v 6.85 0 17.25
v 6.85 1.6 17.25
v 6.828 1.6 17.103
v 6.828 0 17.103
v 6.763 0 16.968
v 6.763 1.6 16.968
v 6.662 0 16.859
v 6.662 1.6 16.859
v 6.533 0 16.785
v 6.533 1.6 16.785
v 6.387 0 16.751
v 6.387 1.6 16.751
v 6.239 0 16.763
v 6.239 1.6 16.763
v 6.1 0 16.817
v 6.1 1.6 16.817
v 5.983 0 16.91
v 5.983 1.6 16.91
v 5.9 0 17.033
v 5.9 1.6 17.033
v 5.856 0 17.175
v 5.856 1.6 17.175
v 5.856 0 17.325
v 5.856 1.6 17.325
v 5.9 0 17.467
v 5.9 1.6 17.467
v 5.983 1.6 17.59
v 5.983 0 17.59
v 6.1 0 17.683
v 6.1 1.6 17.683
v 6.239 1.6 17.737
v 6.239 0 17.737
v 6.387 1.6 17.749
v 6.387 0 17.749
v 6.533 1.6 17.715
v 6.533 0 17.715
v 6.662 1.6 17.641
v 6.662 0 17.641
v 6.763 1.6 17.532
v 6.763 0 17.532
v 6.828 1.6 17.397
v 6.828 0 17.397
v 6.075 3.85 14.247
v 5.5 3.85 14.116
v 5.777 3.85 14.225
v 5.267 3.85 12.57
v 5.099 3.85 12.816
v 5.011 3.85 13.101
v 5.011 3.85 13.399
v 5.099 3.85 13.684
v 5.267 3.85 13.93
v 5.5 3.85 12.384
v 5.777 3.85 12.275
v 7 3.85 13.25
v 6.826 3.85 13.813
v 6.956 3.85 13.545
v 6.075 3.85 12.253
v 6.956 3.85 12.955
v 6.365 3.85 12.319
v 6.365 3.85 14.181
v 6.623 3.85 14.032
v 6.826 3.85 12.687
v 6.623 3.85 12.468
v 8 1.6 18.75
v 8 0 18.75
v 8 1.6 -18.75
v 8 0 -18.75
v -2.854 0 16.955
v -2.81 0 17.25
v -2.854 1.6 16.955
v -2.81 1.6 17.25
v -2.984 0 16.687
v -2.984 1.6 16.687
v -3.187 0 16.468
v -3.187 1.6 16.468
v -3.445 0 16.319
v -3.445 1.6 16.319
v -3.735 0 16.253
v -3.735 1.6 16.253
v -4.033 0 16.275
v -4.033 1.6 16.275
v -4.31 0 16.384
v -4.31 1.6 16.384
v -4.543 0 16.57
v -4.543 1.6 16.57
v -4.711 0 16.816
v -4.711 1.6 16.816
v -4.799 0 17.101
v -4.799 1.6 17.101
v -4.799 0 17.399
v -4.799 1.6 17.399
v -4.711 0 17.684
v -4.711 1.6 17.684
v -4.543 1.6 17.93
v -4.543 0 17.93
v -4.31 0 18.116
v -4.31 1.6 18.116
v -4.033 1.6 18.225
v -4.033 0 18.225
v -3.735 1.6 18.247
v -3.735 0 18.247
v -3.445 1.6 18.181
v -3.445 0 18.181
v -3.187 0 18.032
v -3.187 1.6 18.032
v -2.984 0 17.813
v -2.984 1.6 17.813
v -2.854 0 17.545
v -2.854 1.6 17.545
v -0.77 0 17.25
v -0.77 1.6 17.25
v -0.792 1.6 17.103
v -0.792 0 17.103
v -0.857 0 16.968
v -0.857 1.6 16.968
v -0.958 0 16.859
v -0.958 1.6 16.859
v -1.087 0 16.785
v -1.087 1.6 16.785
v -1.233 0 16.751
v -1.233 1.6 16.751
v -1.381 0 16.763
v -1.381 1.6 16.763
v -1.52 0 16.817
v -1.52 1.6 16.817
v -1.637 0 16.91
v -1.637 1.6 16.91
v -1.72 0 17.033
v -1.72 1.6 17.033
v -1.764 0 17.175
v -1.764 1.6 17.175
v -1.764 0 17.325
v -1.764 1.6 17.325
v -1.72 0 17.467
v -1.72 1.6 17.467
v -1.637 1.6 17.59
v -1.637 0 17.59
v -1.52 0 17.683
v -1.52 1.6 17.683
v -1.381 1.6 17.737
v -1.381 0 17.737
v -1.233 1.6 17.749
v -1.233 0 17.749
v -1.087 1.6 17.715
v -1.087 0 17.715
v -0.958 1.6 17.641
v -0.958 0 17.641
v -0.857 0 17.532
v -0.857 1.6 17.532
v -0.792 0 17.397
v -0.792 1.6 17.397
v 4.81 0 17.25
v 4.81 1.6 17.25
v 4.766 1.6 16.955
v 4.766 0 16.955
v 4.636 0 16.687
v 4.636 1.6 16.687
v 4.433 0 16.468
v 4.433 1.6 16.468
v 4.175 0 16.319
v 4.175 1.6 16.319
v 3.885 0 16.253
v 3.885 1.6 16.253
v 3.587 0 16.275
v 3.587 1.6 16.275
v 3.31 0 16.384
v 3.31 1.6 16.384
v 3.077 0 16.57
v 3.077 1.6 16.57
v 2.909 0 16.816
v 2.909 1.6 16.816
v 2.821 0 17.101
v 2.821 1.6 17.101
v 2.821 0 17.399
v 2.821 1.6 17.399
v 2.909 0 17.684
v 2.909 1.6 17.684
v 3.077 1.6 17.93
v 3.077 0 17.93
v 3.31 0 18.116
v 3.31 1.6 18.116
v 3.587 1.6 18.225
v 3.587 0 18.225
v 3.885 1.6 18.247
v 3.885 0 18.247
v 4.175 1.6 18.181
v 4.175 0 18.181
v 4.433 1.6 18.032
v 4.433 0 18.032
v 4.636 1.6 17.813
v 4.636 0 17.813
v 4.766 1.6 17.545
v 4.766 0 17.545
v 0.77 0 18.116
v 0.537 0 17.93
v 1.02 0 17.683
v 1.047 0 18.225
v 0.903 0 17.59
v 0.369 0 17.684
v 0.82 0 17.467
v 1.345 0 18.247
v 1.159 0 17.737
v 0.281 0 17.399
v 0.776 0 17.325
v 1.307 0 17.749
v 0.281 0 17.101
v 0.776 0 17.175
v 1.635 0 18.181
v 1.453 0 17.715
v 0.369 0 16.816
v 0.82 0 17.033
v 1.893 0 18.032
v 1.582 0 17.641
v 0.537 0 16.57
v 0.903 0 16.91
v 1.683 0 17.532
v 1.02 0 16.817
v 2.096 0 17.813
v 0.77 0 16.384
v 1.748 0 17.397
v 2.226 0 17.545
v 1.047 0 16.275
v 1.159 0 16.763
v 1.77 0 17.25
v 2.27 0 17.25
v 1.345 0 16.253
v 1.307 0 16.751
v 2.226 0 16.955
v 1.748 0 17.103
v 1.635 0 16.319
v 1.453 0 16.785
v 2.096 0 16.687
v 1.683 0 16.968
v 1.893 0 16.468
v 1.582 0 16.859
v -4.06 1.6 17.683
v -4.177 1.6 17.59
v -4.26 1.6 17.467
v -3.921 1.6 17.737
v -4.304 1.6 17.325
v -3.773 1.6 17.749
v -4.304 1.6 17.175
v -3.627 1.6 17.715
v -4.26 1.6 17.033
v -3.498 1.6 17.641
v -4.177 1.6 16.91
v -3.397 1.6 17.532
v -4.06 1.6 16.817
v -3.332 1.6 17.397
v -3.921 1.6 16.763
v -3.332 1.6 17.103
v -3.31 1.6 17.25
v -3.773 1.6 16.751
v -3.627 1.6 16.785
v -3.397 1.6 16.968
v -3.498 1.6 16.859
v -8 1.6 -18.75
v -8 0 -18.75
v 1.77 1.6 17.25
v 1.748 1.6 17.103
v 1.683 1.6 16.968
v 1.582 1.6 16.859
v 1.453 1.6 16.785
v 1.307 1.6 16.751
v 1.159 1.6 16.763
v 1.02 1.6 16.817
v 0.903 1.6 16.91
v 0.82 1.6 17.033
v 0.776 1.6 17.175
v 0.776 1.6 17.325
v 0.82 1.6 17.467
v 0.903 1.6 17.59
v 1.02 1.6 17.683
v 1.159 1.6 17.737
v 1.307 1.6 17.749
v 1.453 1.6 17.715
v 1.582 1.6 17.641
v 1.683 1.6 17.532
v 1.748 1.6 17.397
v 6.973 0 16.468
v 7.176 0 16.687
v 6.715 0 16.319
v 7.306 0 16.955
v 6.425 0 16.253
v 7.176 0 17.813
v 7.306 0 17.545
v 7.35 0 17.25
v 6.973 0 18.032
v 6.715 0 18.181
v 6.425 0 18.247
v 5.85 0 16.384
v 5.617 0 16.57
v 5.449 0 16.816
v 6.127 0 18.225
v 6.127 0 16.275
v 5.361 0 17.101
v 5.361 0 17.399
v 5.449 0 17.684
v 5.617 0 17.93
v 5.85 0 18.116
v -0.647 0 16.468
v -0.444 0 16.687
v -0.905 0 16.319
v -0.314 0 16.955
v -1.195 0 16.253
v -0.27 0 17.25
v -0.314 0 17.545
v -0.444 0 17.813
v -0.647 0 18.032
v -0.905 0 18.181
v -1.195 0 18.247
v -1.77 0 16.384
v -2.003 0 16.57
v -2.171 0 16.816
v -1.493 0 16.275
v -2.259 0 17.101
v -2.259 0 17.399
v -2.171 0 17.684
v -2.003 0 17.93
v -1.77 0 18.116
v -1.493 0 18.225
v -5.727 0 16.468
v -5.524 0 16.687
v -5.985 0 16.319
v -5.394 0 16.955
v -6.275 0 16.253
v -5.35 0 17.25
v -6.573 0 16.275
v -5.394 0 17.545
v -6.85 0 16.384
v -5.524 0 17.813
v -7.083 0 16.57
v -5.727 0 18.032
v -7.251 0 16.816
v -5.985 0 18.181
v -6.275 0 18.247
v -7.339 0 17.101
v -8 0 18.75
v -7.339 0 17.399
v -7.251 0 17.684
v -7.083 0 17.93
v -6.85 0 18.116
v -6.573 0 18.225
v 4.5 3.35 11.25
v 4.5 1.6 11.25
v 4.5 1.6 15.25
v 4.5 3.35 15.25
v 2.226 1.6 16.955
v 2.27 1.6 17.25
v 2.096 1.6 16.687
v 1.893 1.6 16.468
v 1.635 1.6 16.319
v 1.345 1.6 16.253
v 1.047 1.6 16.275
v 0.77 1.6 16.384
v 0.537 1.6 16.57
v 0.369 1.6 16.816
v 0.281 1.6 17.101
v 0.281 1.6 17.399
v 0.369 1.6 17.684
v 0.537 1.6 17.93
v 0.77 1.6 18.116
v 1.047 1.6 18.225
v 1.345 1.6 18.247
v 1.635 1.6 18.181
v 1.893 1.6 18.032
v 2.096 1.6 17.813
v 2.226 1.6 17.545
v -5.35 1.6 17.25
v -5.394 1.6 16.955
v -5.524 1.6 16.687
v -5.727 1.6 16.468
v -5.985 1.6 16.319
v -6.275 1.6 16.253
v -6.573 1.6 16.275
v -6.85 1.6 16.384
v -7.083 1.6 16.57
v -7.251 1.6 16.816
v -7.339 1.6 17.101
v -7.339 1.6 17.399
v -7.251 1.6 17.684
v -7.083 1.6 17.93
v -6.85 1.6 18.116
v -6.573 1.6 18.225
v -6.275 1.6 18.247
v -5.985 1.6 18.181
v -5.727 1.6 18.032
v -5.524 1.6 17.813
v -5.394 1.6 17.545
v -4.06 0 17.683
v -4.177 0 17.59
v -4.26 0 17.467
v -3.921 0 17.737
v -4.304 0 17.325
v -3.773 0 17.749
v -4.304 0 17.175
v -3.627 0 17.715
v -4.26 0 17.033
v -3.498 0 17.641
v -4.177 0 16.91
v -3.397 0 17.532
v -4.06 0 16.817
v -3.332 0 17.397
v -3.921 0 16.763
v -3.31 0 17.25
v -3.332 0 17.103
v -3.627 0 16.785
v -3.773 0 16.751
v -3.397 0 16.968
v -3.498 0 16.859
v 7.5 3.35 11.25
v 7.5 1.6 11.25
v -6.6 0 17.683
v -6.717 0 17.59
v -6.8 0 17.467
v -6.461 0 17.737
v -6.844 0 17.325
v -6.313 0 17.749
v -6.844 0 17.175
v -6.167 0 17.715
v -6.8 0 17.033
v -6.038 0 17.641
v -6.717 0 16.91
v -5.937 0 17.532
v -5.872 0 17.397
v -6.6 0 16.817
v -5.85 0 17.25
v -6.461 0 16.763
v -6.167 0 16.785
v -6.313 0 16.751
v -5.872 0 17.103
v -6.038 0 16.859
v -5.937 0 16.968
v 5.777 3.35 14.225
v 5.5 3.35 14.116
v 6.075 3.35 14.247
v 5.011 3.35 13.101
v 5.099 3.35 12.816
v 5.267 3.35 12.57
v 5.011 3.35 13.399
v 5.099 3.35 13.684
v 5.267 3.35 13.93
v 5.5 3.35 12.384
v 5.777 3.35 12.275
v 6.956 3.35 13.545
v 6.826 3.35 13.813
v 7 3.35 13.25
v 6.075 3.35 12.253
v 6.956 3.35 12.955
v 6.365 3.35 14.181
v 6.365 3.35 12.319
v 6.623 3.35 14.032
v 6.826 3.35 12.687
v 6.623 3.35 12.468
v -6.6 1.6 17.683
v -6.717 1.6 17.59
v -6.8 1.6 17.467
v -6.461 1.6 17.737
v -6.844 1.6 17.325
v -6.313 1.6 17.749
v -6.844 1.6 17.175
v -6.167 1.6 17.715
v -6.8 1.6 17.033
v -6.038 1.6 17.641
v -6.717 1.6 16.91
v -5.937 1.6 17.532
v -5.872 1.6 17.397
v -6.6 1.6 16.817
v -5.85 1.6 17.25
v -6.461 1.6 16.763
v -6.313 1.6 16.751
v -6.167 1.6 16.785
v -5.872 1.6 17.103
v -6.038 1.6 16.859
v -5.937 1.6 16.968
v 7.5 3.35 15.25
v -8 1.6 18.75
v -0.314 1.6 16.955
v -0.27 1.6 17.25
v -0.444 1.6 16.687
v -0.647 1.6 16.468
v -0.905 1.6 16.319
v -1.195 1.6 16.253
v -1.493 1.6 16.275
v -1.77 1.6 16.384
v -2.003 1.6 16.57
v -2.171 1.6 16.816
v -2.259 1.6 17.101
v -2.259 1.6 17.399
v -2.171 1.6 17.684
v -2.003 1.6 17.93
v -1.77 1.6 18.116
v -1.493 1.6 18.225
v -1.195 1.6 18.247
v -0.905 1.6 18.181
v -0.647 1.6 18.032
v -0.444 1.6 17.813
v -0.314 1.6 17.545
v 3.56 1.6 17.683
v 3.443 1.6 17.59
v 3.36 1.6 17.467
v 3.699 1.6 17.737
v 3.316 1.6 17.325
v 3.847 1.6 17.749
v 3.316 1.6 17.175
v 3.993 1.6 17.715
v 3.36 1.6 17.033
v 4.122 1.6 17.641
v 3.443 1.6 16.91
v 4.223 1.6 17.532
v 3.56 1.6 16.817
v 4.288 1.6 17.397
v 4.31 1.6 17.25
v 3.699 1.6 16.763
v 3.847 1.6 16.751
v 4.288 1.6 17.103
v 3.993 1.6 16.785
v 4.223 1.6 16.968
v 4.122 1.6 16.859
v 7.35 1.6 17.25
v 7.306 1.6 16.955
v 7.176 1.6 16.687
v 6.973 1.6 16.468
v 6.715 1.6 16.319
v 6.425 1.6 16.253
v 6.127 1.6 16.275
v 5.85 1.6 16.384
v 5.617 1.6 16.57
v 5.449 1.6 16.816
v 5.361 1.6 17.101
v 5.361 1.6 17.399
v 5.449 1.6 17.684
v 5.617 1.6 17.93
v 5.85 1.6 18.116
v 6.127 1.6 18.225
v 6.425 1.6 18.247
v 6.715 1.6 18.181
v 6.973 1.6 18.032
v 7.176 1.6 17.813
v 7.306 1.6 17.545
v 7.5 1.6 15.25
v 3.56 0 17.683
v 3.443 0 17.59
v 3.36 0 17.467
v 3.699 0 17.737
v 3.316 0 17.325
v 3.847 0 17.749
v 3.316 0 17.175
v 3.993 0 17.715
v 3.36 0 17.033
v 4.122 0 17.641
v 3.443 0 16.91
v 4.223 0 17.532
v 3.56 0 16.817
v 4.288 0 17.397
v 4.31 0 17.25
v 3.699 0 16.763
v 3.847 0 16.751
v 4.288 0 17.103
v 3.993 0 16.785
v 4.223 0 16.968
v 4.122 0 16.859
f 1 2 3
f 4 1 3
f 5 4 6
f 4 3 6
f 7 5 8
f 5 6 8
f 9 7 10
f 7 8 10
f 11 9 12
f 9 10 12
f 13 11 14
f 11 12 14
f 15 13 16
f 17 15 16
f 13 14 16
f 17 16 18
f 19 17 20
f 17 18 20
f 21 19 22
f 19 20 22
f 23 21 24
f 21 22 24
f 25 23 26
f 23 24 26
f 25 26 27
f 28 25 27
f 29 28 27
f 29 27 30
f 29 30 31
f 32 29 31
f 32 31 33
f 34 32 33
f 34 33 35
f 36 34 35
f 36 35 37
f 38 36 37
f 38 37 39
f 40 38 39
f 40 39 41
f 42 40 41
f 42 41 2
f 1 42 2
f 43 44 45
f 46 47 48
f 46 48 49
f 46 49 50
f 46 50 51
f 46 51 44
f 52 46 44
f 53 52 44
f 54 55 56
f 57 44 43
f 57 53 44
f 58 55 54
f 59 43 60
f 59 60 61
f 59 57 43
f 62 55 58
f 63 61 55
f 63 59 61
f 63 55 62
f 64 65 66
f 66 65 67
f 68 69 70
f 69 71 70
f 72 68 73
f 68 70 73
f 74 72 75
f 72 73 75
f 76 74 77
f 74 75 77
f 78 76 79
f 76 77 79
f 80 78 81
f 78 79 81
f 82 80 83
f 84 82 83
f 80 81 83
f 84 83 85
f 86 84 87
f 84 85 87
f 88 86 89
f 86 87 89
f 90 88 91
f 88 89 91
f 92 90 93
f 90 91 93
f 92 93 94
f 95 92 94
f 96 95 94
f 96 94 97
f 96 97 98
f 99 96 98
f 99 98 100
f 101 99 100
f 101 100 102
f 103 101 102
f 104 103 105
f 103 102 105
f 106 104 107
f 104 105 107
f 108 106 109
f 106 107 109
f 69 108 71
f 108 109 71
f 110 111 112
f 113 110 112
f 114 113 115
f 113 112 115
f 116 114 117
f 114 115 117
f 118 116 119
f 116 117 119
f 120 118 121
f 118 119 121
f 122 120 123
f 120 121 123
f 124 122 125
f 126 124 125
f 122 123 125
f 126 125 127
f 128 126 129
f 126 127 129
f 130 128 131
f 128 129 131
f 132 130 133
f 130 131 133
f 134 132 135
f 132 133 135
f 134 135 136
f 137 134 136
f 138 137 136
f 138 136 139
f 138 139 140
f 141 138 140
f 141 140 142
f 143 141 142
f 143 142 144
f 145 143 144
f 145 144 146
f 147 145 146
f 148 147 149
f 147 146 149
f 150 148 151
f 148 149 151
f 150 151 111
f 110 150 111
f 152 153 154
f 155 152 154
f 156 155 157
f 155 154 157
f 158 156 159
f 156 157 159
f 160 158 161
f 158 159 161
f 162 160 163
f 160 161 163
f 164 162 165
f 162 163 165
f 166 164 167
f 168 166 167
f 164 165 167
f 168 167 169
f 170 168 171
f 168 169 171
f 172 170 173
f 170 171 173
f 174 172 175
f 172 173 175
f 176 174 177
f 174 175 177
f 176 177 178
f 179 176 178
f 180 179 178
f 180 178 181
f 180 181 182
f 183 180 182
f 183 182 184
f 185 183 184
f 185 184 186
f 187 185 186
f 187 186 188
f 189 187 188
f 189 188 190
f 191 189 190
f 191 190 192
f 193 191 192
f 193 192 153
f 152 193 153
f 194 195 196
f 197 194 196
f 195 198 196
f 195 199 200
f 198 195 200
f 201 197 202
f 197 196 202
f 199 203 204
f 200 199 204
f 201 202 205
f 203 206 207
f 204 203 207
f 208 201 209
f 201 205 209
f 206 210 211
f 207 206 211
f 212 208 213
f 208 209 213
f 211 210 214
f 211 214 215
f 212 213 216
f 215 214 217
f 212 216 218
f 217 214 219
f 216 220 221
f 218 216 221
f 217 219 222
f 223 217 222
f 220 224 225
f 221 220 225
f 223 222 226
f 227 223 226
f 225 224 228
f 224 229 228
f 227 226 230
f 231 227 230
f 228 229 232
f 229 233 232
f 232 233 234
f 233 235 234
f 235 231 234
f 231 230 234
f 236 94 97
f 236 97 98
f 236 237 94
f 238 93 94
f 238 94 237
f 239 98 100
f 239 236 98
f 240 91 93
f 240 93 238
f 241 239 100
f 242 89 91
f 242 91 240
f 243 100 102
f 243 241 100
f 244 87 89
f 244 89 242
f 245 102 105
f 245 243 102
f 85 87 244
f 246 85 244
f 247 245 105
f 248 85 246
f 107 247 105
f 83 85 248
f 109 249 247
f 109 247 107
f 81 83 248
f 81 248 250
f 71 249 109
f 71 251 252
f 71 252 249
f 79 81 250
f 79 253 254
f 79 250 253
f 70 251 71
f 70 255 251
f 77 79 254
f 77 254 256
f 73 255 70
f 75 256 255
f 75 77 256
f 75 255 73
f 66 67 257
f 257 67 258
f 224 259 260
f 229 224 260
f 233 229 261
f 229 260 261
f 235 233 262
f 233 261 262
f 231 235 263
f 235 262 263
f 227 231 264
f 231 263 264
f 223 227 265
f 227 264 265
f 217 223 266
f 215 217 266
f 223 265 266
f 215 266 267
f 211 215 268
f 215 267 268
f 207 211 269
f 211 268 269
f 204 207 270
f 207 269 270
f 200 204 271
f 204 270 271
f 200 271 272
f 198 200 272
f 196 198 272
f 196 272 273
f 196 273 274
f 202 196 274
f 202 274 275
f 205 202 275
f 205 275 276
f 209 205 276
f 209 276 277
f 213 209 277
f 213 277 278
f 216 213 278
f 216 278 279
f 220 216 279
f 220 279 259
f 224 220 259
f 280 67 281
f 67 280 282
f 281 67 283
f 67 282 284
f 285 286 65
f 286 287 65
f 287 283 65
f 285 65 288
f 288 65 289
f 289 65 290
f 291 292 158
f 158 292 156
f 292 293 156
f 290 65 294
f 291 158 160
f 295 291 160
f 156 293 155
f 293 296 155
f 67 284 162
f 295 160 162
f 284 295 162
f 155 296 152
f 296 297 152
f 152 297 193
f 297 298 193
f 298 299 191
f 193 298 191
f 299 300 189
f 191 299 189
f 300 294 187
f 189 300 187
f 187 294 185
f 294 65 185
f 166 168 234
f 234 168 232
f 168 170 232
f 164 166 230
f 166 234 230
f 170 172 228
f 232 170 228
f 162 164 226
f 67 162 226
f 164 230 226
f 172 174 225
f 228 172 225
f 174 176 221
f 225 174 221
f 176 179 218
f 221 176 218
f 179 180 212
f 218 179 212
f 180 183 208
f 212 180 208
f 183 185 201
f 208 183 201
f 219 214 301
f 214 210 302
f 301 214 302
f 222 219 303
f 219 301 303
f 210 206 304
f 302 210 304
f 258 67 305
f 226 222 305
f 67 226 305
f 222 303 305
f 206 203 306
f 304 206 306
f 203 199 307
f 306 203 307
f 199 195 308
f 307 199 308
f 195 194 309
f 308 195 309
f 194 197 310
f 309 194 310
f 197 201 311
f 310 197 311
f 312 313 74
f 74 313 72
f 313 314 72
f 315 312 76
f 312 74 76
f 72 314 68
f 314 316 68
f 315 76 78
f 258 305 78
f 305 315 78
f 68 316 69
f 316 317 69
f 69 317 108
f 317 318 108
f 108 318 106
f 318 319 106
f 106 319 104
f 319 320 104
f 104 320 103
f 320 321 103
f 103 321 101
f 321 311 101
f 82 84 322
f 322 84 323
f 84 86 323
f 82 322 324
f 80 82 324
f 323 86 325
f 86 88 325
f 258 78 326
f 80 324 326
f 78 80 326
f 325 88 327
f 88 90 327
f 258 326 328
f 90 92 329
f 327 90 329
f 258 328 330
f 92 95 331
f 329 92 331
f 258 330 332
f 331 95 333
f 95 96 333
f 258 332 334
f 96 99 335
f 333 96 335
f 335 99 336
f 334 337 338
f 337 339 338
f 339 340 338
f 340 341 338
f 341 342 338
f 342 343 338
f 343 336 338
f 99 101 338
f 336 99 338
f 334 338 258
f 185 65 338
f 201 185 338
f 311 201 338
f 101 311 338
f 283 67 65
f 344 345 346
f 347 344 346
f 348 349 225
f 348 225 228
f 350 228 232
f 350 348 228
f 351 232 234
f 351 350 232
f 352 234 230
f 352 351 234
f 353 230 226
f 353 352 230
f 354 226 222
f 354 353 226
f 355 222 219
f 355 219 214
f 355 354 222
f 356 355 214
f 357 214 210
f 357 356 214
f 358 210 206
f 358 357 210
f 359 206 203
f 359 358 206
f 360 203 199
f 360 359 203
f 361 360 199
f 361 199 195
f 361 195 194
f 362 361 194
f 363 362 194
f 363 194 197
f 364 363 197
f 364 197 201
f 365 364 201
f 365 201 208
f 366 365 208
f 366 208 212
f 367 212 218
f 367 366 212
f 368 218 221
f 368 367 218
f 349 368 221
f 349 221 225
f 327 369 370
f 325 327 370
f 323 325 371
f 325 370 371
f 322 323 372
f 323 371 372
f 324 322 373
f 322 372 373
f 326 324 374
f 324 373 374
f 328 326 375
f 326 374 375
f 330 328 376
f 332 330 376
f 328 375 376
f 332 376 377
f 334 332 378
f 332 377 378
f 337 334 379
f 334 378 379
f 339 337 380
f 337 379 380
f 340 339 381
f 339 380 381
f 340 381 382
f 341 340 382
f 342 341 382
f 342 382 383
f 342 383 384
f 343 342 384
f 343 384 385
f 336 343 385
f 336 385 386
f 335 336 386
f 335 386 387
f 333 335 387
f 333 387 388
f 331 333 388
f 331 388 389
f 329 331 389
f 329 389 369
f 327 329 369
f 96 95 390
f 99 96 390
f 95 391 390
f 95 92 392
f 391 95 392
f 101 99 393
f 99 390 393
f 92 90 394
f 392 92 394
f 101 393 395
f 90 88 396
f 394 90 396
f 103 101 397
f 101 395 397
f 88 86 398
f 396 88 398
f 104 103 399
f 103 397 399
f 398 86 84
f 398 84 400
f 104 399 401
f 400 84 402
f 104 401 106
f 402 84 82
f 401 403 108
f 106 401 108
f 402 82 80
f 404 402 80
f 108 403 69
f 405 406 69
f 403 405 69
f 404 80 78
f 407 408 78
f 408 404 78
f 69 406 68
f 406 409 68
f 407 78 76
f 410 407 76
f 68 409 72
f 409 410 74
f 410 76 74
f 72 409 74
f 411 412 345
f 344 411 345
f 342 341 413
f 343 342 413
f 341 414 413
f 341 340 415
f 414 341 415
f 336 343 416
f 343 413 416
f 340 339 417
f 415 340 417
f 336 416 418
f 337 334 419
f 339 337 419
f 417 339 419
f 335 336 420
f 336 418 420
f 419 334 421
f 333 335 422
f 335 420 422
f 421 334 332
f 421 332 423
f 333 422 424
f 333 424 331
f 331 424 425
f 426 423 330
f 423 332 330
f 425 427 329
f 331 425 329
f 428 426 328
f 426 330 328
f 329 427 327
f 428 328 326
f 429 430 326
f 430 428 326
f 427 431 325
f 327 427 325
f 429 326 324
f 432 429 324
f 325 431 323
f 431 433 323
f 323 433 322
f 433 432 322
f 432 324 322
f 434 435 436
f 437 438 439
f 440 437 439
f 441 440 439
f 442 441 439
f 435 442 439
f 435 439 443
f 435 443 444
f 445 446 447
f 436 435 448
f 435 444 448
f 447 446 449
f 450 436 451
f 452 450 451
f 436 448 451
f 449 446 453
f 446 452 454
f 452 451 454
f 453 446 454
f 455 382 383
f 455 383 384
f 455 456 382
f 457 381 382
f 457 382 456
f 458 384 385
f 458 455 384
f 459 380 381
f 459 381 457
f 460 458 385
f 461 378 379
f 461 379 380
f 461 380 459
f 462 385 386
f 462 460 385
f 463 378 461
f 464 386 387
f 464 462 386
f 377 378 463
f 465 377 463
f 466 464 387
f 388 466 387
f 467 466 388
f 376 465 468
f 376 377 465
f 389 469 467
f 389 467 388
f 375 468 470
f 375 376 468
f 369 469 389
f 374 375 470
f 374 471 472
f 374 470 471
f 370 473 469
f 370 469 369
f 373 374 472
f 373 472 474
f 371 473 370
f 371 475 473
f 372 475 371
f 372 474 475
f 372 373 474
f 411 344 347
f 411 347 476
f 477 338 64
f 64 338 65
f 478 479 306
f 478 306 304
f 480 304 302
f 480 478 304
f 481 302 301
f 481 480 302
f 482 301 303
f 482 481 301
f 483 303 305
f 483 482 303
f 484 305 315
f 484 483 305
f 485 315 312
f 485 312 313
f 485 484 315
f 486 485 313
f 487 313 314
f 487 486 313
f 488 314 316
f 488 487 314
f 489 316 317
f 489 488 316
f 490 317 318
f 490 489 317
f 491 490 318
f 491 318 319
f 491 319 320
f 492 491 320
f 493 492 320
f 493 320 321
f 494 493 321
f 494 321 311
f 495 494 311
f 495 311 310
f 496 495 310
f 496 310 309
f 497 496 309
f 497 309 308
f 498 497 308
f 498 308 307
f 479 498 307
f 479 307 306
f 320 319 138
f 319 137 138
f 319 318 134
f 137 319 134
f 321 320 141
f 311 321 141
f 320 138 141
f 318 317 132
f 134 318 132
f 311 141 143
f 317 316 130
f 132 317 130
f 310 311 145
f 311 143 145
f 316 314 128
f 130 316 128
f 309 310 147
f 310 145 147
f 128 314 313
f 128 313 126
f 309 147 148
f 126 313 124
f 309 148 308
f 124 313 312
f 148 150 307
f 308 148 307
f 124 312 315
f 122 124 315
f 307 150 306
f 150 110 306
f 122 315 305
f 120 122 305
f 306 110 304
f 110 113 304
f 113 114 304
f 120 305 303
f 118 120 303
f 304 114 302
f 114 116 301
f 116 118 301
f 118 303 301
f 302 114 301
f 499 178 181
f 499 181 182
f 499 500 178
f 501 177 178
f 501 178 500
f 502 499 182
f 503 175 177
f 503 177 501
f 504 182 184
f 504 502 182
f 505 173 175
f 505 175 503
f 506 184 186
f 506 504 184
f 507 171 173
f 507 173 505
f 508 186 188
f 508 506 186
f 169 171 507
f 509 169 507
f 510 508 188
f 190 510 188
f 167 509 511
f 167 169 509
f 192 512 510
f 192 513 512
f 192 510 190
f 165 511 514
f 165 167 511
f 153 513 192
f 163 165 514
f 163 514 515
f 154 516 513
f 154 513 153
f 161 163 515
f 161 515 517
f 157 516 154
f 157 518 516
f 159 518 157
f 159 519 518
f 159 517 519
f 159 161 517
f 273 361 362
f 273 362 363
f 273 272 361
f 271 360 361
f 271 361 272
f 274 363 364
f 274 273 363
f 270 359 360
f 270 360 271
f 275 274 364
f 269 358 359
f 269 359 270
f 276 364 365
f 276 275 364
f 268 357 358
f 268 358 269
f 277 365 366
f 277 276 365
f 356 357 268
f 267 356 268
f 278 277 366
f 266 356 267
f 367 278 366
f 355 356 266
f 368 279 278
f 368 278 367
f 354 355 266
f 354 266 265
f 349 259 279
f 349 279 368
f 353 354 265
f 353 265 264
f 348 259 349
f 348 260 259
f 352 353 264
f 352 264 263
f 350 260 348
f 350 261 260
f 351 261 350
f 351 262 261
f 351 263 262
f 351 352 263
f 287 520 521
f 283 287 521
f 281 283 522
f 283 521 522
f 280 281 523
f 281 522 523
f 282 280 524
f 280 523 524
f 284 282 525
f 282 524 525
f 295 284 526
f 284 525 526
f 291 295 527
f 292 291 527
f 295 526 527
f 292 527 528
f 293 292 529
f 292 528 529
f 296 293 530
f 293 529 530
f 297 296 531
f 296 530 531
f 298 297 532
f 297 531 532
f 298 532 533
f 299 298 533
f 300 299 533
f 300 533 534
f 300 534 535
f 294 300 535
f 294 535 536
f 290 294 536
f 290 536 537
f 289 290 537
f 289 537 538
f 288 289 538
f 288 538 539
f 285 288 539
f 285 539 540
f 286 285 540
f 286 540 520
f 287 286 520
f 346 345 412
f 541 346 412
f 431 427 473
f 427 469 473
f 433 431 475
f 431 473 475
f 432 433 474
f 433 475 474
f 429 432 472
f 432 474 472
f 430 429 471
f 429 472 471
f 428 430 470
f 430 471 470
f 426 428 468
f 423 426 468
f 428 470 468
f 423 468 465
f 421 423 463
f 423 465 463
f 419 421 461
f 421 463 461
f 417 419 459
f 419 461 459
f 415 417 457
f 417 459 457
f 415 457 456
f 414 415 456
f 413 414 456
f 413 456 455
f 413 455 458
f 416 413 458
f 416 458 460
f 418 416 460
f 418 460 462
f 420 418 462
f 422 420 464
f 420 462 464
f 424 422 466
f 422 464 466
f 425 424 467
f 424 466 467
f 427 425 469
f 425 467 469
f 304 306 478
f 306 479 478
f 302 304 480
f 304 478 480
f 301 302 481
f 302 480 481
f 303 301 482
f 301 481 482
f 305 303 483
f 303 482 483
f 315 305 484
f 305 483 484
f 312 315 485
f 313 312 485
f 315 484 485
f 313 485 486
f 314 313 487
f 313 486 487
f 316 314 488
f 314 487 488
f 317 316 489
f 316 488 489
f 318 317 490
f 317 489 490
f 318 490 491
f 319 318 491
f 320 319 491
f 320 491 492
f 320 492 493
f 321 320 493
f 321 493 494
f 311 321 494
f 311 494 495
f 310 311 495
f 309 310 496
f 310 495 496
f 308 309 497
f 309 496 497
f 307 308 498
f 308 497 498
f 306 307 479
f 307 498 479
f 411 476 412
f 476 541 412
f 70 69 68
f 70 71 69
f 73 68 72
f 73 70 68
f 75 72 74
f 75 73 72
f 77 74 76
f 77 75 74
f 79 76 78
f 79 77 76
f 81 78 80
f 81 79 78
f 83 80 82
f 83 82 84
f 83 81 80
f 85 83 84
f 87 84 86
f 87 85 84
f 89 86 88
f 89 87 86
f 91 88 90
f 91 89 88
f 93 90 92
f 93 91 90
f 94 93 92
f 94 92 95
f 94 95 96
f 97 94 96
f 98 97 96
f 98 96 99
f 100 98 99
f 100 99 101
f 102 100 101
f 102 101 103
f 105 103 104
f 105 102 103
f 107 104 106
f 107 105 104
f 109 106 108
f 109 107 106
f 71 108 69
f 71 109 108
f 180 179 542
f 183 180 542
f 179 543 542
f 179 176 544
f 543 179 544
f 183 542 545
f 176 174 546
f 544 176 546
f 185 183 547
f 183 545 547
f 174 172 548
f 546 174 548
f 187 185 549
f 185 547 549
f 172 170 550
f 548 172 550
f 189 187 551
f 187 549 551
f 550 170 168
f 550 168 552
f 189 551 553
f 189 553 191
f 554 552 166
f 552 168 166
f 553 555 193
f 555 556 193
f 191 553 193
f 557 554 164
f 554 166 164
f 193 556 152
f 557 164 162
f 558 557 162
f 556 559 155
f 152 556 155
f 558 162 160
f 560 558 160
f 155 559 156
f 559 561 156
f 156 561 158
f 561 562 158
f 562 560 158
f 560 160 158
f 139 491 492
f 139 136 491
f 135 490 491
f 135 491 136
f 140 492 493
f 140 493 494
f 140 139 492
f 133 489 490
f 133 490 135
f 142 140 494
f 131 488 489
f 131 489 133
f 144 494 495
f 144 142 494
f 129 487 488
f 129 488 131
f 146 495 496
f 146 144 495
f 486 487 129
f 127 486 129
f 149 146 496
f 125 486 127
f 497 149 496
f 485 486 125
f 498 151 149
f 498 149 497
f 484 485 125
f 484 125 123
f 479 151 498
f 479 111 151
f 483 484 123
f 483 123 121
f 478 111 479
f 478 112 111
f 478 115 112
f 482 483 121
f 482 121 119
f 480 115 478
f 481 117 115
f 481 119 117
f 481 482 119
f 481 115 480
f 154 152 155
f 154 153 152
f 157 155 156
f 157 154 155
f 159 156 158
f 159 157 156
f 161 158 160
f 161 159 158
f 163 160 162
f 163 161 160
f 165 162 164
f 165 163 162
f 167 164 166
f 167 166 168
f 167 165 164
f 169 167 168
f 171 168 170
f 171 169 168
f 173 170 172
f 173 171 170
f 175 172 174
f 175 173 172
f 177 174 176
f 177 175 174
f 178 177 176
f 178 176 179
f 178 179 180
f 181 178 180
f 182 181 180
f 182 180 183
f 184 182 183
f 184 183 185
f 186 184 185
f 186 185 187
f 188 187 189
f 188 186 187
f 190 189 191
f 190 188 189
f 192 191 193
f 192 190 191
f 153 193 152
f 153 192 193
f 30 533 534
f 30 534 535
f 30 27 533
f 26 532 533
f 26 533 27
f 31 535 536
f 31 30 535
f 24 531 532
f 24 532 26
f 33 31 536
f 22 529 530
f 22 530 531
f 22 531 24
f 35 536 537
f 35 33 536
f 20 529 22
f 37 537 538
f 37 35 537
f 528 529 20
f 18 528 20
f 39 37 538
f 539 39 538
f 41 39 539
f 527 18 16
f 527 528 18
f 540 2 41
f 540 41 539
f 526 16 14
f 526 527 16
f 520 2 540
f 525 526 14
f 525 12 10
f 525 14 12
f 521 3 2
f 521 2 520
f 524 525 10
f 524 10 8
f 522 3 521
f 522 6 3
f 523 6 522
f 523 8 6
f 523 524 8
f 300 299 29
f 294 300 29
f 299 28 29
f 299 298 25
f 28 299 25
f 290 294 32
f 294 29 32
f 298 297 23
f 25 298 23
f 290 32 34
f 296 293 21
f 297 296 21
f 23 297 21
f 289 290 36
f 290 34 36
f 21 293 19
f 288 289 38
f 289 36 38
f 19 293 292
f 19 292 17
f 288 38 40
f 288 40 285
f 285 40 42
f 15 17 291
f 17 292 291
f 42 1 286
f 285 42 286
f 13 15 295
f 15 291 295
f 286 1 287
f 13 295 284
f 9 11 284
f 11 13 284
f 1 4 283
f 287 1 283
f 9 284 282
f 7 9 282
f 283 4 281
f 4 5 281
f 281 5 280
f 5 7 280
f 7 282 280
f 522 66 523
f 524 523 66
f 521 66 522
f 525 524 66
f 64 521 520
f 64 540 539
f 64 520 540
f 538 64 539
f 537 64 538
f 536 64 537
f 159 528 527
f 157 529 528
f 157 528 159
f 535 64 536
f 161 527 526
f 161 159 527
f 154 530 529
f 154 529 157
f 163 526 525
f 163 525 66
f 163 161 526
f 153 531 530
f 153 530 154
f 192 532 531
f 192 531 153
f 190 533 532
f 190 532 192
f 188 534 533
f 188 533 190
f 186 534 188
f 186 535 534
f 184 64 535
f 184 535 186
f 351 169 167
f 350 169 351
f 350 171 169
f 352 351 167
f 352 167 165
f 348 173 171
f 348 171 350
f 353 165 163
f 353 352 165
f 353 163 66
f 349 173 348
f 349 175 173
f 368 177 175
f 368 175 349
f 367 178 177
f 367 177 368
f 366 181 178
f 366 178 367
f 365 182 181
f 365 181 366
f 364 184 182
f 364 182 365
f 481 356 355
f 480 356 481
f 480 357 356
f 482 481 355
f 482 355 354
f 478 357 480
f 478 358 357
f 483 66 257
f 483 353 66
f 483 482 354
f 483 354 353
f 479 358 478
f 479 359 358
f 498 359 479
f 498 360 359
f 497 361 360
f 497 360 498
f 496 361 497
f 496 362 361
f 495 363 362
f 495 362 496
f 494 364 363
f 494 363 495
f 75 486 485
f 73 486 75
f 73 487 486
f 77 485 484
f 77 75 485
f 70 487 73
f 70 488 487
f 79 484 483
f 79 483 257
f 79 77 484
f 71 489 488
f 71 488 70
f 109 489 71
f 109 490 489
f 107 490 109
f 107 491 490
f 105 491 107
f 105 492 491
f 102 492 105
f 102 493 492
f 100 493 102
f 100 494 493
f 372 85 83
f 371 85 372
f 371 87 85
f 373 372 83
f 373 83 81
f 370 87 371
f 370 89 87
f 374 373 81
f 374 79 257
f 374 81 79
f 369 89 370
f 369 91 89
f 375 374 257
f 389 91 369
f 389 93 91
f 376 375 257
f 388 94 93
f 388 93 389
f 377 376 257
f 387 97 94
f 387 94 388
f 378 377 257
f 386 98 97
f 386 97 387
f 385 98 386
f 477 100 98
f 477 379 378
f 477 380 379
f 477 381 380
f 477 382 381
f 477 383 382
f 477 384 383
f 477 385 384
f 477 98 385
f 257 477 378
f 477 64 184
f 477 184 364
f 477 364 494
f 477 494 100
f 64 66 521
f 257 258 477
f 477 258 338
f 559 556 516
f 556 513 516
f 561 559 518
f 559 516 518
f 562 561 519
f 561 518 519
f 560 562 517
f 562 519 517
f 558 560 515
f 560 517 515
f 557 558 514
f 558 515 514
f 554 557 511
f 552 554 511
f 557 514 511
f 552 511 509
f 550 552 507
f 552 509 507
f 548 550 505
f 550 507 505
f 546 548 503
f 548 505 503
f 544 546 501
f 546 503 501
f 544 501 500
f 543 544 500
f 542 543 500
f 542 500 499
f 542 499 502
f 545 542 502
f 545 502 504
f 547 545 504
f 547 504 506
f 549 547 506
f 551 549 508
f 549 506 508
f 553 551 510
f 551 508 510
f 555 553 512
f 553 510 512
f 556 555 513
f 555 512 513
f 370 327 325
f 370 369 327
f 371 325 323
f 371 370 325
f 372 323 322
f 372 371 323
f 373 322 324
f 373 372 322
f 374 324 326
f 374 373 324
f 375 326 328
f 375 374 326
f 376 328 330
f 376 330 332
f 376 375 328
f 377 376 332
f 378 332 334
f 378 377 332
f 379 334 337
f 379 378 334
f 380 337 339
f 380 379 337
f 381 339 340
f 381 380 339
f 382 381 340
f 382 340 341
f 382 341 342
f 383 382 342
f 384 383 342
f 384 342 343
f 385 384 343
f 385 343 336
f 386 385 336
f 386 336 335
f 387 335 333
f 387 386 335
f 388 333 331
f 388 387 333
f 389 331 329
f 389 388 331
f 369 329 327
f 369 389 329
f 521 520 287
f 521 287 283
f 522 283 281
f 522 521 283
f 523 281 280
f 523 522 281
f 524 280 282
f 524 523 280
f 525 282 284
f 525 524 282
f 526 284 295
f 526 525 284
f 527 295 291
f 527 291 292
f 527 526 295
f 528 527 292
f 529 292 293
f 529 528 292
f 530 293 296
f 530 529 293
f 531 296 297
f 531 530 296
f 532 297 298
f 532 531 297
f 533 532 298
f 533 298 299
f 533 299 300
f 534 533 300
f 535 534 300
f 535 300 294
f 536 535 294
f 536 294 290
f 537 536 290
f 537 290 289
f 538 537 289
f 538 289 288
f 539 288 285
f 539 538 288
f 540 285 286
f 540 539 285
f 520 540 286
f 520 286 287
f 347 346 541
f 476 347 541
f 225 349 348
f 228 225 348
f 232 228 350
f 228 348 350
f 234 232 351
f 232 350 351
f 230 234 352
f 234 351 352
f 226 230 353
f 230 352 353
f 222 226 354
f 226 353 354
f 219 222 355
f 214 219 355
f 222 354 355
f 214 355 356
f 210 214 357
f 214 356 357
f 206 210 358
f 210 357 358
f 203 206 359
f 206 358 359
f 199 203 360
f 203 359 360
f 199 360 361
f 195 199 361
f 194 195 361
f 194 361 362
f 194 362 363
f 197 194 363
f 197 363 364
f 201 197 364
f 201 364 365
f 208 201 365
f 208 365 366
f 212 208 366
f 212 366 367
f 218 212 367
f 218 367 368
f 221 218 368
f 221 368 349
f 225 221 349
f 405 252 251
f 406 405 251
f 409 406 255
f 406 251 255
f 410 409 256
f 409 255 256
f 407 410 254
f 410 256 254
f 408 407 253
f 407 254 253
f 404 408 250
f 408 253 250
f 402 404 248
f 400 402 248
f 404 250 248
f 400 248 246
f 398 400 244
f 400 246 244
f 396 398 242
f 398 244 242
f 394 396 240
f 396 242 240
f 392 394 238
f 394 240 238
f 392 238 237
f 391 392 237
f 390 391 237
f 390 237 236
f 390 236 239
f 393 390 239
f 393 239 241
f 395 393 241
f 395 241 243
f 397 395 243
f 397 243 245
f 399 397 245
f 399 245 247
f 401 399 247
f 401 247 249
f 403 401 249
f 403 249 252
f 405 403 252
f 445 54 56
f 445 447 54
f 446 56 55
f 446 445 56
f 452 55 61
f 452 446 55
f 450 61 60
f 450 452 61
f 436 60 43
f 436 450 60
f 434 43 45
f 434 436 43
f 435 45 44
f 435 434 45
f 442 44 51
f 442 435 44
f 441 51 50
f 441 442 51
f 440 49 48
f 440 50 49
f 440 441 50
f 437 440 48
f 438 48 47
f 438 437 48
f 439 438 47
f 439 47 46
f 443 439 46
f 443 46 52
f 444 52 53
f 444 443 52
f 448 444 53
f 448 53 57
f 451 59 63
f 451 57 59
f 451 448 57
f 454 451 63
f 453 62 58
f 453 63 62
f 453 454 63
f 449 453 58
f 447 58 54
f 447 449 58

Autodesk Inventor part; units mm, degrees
ref_plane "YZ Plane" through (0, 0, 0) normal (1, 0, 0) x (0, 1, 0)
ref_plane "XZ Plane" through (0, 0, 0) normal (0, 1, 0) x (-1, 0, 0)
ref_plane "XY Plane" through (0, 0, 0) normal (0, 0, 1) x (1, 0, 0)
sketch "Sketch1" plane through (0, 0, 0) normal (0, 1, 0) x (-1, 0, 0)
  line L0 (-8, -18.75) -> (8, -18.75)
  line L1 (8, -18.75) -> (8, 18.75)
  line L2 (8, 18.75) -> (-8, 18.75)
  line L3 (-8, 18.75) -> (-8, -18.75)
  line L4 (-8, -18.75) -> (8, 18.75) construction
  line L5 (8, -18.75) -> (-8, 18.75) construction
  point P0 (0, 0)
  dimension "d0" = 16
  dimension "d1" = 37.5
extrude "Extrusion1" add sketch "Sketch1" along normal blind 1.6
sketch "Sketch2" plane through (0, 1.6, 0) normal (0, 1, 0) x (1, 0, 0)
  line L0 (4.5, -15.25) -> (7.5, -15.25)
  line L1 (7.5, -15.25) -> (7.5, -11.25)
  line L2 (7.5, -11.25) -> (4.5, -11.25)
  line L3 (4.5, -11.25) -> (4.5, -15.25)
  line L4 (8, -18.75) -> (8, 18.75) projected
  line L5 (-8, -18.75) -> (8, -18.75) projected
  point P0 (0, 0)
  dimension "d4" = 3
  dimension "d5" = 4
  dimension "d6" = 0.5
  dimension "d7" = 3.5
extrude "Extrusion2" add sketch "Sketch2" along normal blind 1.75 separate body
sketch "Sketch3" plane through (0, 3.35, 0) normal (0, 1, 0) x (1, 0, 0)
  circle A0 centre (6, -13.25) radius 1
  line L0 (7.5, -11.25) -> (4.5, -11.25) projected
  line L1 (4.5, -11.25) -> (4.5, -15.25) projected
  point P0 (0, 0)
  point P1 (6, -11.25)
  point P2 (4.5, -13.25)
  dimension "d10" = 2
extrude "Extrusion3" add sketch "Sketch3" along normal blind 0.5 separate body
sketch "Sketch4" plane through (0, 1.6, 0) normal (0, 1, 0) x (1, 0, 0)
  line L0 (0, 0) -> (0, -4.1131)
  circle A0 centre (1.27, -17.25) radius 0.5
  circle A1 centre (1.27, -17.25) radius 1
  circle A2 centre (3.81, -17.25) radius 0.5
  circle A3 centre (3.81, -17.25) radius 1
  circle A4 centre (6.35, -17.25) radius 0.5
  circle A5 centre (6.35, -17.25) radius 1
  line L1 (-8, -18.75) -> (8, -18.75) projected
  circle A6 centre (-1.27, -17.25) radius 0.5
  circle A7 centre (-1.27, -17.25) radius 1
  circle A8 centre (-3.81, -17.25) radius 0.5
  circle A9 centre (-3.81, -17.25) radius 1
  circle A10 centre (-6.35, -17.25) radius 0.5
  circle A11 centre (-6.35, -17.25) radius 1
  dimension "d13" = 2.54
  dimension "d14" = 2.54
  dimension "d15" = 1.27
  dimension "d16" = 1
  dimension "d17" = 2
  dimension "d20" = 1.5
extrude "Extrusion4" cut sketch "Sketch4" against normal through all contours A0 | A1 | A2 | A3 | A4 | A5 | A6 | A7 | A8 | A9 | A10 | A11 bodies 1
extrude "Extrusion5" add sketch "Sketch4" against normal up to surface (1.6 mm away) separate body
properties part number "ZS-040"
